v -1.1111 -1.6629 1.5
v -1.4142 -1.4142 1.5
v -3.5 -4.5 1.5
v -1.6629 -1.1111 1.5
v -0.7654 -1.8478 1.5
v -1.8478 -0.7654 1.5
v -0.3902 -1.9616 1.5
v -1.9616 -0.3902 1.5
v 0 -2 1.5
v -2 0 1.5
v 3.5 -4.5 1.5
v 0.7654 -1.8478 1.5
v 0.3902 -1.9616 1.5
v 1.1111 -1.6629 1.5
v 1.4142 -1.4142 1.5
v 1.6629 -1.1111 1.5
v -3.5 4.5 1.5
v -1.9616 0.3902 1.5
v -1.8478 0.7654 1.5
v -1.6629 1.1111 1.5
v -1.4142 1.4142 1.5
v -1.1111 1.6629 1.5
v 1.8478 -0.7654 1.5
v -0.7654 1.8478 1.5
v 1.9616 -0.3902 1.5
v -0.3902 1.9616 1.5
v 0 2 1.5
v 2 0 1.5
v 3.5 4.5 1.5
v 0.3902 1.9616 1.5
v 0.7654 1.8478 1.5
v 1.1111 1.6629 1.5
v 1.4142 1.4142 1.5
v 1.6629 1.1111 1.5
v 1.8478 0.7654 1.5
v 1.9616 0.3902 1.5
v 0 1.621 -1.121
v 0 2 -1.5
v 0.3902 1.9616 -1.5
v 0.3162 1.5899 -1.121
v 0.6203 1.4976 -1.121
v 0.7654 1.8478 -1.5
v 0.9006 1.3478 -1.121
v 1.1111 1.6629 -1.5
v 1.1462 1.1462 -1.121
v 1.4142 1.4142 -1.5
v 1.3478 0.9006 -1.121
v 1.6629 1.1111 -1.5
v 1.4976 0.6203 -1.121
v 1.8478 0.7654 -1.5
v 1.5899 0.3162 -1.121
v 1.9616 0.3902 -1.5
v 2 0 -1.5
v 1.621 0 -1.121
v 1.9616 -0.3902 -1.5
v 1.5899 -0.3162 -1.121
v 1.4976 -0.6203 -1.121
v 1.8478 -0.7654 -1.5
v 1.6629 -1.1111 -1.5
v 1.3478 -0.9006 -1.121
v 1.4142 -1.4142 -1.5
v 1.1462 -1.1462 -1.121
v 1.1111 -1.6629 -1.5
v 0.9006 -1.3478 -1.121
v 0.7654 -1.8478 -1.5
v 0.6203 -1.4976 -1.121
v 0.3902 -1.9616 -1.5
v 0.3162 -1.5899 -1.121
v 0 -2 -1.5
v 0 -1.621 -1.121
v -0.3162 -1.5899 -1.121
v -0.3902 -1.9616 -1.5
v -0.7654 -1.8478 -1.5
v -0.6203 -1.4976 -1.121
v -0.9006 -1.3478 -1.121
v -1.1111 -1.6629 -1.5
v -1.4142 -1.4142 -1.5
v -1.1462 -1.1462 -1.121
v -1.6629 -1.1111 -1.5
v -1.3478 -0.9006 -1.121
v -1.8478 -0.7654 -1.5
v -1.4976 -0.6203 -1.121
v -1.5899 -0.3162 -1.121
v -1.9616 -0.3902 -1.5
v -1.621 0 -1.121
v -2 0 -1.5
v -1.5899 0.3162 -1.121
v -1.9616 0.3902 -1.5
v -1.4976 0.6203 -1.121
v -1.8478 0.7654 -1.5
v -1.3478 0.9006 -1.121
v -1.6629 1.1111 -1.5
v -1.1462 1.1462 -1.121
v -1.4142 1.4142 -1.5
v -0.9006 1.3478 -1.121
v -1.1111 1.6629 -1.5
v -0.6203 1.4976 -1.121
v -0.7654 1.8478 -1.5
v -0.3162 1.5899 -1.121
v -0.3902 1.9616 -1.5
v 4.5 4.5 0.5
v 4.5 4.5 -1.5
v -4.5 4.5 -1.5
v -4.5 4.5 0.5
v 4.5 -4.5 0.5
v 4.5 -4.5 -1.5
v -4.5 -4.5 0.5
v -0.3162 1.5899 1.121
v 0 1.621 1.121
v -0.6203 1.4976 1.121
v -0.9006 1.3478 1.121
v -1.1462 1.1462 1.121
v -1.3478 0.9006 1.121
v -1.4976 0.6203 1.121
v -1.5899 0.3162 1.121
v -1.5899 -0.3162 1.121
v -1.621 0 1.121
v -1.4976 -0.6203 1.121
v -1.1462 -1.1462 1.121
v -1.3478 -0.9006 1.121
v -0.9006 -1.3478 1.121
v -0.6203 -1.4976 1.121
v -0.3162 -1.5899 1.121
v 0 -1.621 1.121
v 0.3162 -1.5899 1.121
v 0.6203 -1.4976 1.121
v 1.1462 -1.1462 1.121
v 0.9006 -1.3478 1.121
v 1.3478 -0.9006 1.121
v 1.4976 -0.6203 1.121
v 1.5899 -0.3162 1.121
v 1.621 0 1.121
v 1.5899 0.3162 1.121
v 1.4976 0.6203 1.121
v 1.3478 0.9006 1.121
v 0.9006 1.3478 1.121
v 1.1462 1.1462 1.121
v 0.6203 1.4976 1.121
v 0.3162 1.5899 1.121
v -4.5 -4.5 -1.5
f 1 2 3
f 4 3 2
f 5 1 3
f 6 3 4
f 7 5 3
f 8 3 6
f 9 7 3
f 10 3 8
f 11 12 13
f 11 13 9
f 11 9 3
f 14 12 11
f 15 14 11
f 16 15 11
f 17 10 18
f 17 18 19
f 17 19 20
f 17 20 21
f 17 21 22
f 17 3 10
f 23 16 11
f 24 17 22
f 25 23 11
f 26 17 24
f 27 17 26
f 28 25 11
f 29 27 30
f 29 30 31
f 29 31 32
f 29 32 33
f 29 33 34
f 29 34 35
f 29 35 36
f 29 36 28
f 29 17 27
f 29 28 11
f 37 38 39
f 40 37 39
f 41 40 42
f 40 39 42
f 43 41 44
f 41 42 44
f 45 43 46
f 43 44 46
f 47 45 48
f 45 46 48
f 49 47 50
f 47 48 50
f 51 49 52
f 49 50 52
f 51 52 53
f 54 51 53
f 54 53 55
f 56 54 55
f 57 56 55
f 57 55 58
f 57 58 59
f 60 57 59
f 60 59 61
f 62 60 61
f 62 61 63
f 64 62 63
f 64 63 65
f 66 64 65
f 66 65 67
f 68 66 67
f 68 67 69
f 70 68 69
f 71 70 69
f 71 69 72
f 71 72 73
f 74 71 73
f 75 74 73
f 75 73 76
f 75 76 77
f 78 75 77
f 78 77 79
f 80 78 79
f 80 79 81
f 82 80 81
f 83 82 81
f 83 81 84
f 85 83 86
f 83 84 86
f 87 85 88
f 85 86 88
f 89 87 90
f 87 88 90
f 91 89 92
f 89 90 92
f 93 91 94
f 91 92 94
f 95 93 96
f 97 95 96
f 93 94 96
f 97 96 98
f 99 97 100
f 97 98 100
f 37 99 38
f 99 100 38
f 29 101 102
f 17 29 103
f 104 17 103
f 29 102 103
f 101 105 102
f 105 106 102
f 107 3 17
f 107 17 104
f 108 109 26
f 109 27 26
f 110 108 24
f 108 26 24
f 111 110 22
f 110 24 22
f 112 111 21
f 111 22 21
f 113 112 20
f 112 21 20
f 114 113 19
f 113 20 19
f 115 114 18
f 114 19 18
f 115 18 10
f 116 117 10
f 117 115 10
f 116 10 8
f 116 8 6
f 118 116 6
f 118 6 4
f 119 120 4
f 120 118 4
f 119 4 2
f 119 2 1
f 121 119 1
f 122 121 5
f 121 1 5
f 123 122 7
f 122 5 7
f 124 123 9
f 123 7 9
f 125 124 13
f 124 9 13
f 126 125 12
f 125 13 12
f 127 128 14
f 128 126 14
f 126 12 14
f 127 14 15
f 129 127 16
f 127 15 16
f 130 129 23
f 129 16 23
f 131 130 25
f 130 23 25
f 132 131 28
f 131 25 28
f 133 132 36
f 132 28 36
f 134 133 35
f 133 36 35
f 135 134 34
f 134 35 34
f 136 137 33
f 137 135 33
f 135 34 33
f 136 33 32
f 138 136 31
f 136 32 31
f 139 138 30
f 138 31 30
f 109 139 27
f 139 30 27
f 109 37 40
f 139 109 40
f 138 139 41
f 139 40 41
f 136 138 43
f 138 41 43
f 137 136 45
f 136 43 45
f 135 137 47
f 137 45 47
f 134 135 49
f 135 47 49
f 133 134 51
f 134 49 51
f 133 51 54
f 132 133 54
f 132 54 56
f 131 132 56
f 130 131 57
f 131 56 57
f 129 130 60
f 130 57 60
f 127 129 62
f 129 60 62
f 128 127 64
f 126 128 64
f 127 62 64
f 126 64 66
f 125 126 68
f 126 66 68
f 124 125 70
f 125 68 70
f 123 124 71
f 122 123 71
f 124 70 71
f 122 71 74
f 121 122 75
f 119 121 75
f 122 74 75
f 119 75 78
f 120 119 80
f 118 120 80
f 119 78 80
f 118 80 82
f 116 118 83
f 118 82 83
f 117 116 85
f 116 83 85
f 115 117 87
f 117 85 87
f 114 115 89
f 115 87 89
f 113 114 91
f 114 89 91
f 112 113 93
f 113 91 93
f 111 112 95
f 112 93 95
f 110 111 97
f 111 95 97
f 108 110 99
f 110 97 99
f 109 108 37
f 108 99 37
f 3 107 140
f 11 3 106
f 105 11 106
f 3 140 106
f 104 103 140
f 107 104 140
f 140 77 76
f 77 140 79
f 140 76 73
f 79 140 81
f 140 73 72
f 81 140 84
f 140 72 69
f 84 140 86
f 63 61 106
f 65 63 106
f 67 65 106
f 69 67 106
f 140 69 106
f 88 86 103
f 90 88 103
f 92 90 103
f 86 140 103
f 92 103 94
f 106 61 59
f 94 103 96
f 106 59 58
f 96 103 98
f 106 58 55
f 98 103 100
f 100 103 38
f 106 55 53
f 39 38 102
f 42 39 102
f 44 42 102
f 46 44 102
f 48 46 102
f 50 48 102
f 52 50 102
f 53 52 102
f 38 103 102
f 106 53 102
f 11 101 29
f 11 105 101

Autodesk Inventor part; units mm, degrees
ref_plane "YZ Plane" through (0, 0, 0) normal (1, 0, 0) x (0, 1, 0)
ref_plane "XZ Plane" through (0, 0, 0) normal (0, 1, 0) x (-1, 0, 0)
ref_plane "XY Plane" through (0, 0, 0) normal (0, 0, 1) x (1, 0, 0)
sketch "Sketch_1" plane through (0, 0, 0) normal (0, 0, 1) x (1, 0, 0)
  line L0 (-4.5, 4.5) -> (-4.5, -4.5)
  line L1 (-4.5, -4.5) -> (4.5, -4.5)
  line L2 (4.5, -4.5) -> (4.5, 4.5)
  line L3 (4.5, 4.5) -> (-4.5, 4.5)
extrude "Extrusion1" add sketch "Sketch_1" along normal mid plane 3
sketch "Sketch_2" plane through (0, 0, 0) normal (1, 0, 0) x (0, 1, 0)
  line L0 (0, -1.5) -> (0, 1.5)
  line L1 (0, 1.5) -> (2, 1.5)
  line L2 (2, 1.5) -> (1.621, 1.121)
  line L3 (1.621, 1.121) -> (1.621, -1.121)
  line L4 (1.621, -1.121) -> (2, -1.5)
  line L5 (2, -1.5) -> (0, -1.5)
  line L6 (0, -1.5) -> (0, 1.5)
revolve "Revolution1" cut sketch "Sketch_2" angle 360 about axis through (0, 0, -1.5) along (0, 0, -1)
thread "Thread1" size "M4x0.7" class "6H" standard "ISO Metric profile" full length
sketch "Sketch_3" plane through (0, 0, 0) normal (0, 1, 0) x (-1, 0, 0)
  line L0 (4.5, 0.5) -> (4.5, 2.5)
  line L1 (4.5, 2.5) -> (-4.5, 2.5)
  line L2 (-4.5, 2.5) -> (-4.5, 0.5)
  line L3 (-4.5, 0.5) -> (-3.5, 1.5)
  line L4 (-3.5, 1.5) -> (3.5, 1.5)
  line L5 (3.5, 1.5) -> (4.5, 0.5)
extrude "Extrusion2" cut sketch "Sketch_3" along normal mid plane 18
properties part number "14159_m"
